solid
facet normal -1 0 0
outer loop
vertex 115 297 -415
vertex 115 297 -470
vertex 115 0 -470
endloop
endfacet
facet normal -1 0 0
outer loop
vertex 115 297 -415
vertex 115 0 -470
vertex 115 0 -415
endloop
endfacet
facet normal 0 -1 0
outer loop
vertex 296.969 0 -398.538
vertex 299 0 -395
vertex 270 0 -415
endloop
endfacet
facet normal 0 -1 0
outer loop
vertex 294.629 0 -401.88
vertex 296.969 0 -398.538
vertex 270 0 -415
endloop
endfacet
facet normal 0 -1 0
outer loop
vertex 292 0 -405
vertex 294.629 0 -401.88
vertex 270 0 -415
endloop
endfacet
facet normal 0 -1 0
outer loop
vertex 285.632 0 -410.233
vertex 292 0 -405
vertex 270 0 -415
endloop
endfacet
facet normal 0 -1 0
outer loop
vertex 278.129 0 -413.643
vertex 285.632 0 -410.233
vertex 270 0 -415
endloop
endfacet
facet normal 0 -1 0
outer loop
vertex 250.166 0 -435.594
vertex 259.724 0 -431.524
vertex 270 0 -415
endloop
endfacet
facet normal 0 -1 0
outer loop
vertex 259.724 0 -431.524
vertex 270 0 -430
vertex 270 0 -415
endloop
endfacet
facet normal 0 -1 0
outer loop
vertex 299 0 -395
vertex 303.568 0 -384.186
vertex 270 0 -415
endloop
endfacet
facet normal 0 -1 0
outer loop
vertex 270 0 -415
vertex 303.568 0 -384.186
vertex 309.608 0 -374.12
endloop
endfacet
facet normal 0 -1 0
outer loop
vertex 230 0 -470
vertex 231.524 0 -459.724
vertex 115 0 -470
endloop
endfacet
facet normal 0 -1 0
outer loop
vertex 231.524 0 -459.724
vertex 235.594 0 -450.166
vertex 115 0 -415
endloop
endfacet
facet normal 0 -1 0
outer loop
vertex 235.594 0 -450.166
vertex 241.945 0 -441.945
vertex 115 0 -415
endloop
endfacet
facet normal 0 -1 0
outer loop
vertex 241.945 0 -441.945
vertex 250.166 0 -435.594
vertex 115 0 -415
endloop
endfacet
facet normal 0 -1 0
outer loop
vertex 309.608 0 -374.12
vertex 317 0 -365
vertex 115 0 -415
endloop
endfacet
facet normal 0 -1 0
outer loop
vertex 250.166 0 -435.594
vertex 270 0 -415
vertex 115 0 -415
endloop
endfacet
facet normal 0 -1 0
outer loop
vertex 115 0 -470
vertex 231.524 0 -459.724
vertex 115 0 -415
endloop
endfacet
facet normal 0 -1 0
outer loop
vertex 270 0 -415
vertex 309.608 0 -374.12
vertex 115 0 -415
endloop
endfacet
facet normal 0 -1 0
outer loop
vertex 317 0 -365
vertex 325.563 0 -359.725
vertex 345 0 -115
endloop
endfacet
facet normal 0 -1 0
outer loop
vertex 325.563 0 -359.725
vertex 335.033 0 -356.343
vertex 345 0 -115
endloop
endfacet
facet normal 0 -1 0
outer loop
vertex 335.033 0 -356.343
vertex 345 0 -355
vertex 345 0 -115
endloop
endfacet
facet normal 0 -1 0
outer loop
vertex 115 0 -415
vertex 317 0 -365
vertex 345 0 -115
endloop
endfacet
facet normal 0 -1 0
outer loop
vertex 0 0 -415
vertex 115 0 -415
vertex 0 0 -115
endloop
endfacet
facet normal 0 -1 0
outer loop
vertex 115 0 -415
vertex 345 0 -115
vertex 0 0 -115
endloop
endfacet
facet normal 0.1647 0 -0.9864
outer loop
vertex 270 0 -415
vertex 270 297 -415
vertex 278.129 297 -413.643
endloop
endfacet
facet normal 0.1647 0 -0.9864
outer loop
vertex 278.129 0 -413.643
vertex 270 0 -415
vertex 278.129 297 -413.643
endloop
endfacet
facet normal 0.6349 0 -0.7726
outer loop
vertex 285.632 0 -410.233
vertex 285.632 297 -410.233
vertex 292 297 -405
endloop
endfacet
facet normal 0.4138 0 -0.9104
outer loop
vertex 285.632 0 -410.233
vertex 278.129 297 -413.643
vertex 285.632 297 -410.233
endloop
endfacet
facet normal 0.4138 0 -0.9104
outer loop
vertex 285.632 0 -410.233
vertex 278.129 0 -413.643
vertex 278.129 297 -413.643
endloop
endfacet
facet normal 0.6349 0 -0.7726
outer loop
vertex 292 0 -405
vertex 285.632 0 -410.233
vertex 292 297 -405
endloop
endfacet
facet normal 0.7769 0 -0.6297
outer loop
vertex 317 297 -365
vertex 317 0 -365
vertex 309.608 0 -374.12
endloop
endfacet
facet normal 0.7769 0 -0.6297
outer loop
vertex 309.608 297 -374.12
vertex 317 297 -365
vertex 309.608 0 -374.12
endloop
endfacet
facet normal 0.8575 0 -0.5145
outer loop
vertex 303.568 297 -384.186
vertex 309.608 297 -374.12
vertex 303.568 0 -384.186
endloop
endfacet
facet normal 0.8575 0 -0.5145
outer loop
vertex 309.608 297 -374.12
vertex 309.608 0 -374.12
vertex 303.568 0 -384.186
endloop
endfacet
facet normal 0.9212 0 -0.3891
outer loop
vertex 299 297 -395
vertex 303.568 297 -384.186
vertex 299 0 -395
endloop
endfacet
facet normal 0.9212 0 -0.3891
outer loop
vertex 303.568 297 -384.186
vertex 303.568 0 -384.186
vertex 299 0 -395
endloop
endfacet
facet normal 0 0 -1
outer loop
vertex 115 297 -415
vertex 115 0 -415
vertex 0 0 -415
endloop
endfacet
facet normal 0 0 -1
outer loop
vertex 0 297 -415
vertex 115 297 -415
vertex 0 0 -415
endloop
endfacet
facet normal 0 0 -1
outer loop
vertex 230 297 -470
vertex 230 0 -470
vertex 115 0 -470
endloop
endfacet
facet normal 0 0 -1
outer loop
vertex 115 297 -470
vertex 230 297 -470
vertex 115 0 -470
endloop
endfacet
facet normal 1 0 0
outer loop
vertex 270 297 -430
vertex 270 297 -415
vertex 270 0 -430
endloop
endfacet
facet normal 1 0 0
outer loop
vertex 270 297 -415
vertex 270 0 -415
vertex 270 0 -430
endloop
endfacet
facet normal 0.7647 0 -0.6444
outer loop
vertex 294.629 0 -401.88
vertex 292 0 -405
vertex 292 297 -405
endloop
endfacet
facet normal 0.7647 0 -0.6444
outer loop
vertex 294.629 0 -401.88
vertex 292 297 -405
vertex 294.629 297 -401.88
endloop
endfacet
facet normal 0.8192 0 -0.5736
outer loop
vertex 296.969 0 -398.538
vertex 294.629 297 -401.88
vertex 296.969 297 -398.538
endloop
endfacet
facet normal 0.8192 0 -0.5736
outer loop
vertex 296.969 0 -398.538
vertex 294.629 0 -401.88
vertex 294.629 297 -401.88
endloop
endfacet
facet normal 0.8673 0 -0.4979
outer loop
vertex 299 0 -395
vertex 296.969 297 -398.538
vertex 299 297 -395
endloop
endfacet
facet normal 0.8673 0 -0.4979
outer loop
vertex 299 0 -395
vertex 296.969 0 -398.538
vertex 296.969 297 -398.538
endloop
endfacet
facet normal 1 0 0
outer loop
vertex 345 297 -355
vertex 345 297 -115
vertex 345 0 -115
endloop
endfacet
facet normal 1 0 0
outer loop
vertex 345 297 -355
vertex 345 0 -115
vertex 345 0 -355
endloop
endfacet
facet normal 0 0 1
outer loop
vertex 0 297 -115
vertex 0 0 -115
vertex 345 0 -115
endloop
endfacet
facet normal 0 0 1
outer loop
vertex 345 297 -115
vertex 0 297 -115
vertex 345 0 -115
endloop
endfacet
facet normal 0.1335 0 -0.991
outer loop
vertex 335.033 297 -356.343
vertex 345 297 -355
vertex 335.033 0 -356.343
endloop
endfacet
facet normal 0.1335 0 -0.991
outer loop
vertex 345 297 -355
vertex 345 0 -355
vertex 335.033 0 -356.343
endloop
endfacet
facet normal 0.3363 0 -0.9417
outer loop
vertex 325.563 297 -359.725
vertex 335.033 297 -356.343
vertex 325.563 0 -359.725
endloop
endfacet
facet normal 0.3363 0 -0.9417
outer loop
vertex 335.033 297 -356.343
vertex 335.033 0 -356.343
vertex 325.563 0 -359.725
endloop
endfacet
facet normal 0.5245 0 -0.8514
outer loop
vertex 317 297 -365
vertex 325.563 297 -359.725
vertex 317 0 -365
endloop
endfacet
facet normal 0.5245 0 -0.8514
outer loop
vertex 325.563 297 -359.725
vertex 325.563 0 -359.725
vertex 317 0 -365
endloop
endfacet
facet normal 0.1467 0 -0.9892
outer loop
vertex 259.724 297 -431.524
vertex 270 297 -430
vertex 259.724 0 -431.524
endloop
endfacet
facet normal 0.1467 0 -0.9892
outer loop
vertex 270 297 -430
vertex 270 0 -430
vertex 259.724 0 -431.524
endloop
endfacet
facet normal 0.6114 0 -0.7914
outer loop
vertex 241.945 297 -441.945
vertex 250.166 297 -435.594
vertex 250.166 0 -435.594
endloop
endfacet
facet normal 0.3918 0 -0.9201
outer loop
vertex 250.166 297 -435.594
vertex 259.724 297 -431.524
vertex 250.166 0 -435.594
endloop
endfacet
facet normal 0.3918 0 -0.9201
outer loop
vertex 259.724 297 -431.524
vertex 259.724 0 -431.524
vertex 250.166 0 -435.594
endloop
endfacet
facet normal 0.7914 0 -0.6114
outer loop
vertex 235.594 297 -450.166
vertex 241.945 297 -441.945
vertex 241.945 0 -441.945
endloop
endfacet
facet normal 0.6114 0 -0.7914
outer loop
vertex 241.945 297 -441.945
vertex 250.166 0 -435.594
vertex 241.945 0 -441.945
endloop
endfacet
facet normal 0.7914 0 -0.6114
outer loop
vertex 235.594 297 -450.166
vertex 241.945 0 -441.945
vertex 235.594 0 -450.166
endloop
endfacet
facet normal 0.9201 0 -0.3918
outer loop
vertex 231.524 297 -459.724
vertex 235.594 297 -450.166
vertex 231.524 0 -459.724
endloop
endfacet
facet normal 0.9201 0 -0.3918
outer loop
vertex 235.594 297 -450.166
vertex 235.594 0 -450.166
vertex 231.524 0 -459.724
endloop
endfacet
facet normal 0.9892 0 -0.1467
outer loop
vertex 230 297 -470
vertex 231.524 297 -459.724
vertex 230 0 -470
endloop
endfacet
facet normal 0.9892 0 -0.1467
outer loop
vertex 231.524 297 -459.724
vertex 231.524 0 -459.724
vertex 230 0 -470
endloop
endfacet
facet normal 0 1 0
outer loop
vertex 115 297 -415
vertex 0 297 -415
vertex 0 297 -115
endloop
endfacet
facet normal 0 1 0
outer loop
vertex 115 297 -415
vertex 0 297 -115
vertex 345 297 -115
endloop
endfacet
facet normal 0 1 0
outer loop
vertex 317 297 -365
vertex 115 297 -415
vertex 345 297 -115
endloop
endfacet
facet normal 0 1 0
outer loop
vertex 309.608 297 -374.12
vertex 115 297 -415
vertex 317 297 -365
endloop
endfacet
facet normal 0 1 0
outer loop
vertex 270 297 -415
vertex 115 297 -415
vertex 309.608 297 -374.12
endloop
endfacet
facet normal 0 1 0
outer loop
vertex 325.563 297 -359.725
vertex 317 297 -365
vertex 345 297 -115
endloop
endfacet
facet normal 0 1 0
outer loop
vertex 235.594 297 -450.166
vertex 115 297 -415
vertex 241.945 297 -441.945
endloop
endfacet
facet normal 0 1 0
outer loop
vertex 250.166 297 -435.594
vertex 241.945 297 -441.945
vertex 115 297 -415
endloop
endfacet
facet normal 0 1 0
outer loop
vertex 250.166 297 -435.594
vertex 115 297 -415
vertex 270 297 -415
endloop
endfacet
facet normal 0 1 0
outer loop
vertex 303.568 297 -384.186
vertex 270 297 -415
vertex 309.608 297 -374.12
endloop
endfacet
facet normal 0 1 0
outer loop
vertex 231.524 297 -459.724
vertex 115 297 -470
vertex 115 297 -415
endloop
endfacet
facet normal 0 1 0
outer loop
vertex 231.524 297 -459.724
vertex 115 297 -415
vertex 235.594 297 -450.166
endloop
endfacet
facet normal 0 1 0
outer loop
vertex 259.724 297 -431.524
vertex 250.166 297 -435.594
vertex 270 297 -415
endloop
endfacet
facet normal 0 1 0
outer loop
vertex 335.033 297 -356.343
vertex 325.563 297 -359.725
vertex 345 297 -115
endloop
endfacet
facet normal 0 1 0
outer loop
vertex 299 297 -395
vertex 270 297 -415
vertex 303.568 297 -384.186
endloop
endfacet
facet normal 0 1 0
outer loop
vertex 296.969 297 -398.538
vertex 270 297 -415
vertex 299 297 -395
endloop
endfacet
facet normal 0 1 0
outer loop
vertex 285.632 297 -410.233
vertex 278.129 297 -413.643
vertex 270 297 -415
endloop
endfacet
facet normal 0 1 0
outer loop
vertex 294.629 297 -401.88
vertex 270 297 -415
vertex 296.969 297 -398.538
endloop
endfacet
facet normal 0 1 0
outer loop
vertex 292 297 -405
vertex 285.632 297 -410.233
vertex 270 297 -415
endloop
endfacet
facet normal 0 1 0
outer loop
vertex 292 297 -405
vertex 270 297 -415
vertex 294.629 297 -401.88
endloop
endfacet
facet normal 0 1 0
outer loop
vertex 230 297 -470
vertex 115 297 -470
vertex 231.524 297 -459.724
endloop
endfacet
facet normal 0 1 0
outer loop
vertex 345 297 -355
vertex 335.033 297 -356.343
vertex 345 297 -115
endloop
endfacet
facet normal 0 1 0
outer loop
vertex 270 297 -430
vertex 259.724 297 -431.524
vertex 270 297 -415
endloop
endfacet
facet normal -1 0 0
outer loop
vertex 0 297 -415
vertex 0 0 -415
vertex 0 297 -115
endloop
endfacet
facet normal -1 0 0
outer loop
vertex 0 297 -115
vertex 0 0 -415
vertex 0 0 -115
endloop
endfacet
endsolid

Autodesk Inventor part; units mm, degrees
ref_plane "YZ Plane" through (0, 0, 0) normal (1, 0, 0) x (0, 1, 0)
ref_plane "XZ Plane" through (0, 0, 0) normal (0, 1, 0) x (-1, 0, 0)
ref_plane "XY Plane" through (0, 0, 0) normal (0, 0, 1) x (1, 0, 0)
sketch "Sketch1" plane through (0, 0, 0) normal (0, 1, 0) x (-1, 0, 0)
  line L0 (0, 0) -> (0, -415)
  line L1 (0, -415) -> (-115, -415)
  line L2 (-115, -415) -> (-115, -470)
  line L3 (-115, -470) -> (-230, -470)
  line L4 (-230, -470) -> (-345, -470) construction
  line L5 (0, 0) -> (-345, 0)
  line L6 (-345, 0) -> (-345, -355)
  line L7 (-270, -415) -> (-270, -430)
  arc A0 (-230, -470) -> (-270, -430) centre (-270.8018, -470.8018) ccw
  line L8 (-345, -355) -> (-345, -360) construction
  line L9 (-345, -360) -> (-325, -360) construction
  line L10 (-345, -360) -> (-345, -365) construction
  line L11 (-345, -365) -> (-345, -370) construction
  line L12 (-345, -370) -> (-345, -375) construction
  line L13 (-345, -375) -> (-345, -380) construction
  line L14 (-345, -365) -> (-317, -365) construction
  line L15 (-345, -370) -> (-312, -370) construction
  line L16 (-345, -375) -> (-309, -375) construction
  line L17 (-345, -380) -> (-306, -380) construction
  line L18 (-345, -380) -> (-345, -385) construction
  line L19 (-345, -385) -> (-345, -390) construction
  line L20 (-345, -390) -> (-345, -395) construction
  line L21 (-345, -395) -> (-345, -400) construction
  line L22 (-345, -400) -> (-345, -405) construction
  line L23 (-345, -405) -> (-345, -410) construction
  line L24 (-345, -385) -> (-303, -385) construction
  line L25 (-345, -390) -> (-301, -390) construction
  line L26 (-345, -395) -> (-299, -395) construction
  line L27 (-345, -400) -> (-296, -400) construction
  line L28 (-345, -405) -> (-292, -405) construction
  line L29 (-345, -410) -> (-286, -410) construction
  arc A1 (-292, -405) -> (-270, -415) centre (-268.9, -383.38) ccw
  arc A2 (-299, -395) -> (-292, -405) centre (-258.5, -374.1) ccw
  arc A3 (-299, -395) -> (-317, -365) centre (-378, -422) ccw
  arc A4 (-317, -365) -> (-345, -355) centre (-346.4167, -403.1667) ccw
  dimension "d0" = 415
  dimension "d1" = 115
  dimension "d2" = 55
  dimension "d3" = 115
  dimension "d4" = 115
  dimension "d5" = 345
  dimension "d6" = 355
  dimension "d7" = 15
  dimension "d8" = 155
  dimension "d9" = 40
  dimension "d17" = 5
  dimension "d18" = 20
  dimension "d19" = 5
  dimension "d20" = 5
  dimension "d21" = 5
  dimension "d22" = 5
  dimension "d23" = 28
  dimension "d24" = 33
  dimension "d25" = 36
  dimension "d26" = 39
  dimension "d27" = 5
  dimension "d28" = 5
  dimension "d29" = 5
  dimension "d30" = 5
  dimension "d31" = 5
  dimension "d32" = 5
  dimension "d34" = 42
  dimension "d35" = 44
  dimension "d36" = 46
  dimension "d37" = 49
  dimension "d38" = 53
  dimension "d39" = 59
  dimension "d43" = 62.5
extrude "Extrusion1" add sketch "Sketch1" along normal blind 10
sketch "Sketch2" plane through (0, 0, 0) normal (0, 0, 1) x (1, 0, 0)
  line L0 (0, 0) -> (345, 0) projected
  line L1 (345, 0) -> (345, 10) projected
  line L2 (0, 10) -> (345, 10) projected
  line L3 (0, 0) -> (0, 10) projected
extrude "Extrusion2" cut sketch "Sketch2" against normal blind 115
sketch "Sketch3" plane through (0, 10, 0) normal (0, 1, 0) x (1, 0, 0)
  line L0 (0, 115) -> (345, 115) projected
  line L1 (345, 115) -> (345, 355) projected
  arc A0 (317, 365) -> (345, 355) centre (346.4167, 403.1667) ccw projected
  arc A1 (299, 395) -> (317, 365) centre (378, 422) ccw projected
  arc A2 (299, 395) -> (292, 405) centre (258.5, 374.1) ccw projected
  arc A3 (292, 405) -> (270, 415) centre (268.9, 383.38) ccw projected
  line L2 (270, 415) -> (270, 430) projected
  arc A4 (230, 470) -> (270, 430) centre (270.8018, 470.8018) ccw projected
  line L3 (230, 470) -> (115, 470) projected
  line L4 (115, 470) -> (115, 415) projected
  line L5 (115, 415) -> (0, 415) projected
  line L6 (0, 415) -> (0, 115) projected
  point P0 (0, 0)
extrude "Extrusion3" add sketch "Sketch3" along normal blind 287
properties part number "Base Drawing"
